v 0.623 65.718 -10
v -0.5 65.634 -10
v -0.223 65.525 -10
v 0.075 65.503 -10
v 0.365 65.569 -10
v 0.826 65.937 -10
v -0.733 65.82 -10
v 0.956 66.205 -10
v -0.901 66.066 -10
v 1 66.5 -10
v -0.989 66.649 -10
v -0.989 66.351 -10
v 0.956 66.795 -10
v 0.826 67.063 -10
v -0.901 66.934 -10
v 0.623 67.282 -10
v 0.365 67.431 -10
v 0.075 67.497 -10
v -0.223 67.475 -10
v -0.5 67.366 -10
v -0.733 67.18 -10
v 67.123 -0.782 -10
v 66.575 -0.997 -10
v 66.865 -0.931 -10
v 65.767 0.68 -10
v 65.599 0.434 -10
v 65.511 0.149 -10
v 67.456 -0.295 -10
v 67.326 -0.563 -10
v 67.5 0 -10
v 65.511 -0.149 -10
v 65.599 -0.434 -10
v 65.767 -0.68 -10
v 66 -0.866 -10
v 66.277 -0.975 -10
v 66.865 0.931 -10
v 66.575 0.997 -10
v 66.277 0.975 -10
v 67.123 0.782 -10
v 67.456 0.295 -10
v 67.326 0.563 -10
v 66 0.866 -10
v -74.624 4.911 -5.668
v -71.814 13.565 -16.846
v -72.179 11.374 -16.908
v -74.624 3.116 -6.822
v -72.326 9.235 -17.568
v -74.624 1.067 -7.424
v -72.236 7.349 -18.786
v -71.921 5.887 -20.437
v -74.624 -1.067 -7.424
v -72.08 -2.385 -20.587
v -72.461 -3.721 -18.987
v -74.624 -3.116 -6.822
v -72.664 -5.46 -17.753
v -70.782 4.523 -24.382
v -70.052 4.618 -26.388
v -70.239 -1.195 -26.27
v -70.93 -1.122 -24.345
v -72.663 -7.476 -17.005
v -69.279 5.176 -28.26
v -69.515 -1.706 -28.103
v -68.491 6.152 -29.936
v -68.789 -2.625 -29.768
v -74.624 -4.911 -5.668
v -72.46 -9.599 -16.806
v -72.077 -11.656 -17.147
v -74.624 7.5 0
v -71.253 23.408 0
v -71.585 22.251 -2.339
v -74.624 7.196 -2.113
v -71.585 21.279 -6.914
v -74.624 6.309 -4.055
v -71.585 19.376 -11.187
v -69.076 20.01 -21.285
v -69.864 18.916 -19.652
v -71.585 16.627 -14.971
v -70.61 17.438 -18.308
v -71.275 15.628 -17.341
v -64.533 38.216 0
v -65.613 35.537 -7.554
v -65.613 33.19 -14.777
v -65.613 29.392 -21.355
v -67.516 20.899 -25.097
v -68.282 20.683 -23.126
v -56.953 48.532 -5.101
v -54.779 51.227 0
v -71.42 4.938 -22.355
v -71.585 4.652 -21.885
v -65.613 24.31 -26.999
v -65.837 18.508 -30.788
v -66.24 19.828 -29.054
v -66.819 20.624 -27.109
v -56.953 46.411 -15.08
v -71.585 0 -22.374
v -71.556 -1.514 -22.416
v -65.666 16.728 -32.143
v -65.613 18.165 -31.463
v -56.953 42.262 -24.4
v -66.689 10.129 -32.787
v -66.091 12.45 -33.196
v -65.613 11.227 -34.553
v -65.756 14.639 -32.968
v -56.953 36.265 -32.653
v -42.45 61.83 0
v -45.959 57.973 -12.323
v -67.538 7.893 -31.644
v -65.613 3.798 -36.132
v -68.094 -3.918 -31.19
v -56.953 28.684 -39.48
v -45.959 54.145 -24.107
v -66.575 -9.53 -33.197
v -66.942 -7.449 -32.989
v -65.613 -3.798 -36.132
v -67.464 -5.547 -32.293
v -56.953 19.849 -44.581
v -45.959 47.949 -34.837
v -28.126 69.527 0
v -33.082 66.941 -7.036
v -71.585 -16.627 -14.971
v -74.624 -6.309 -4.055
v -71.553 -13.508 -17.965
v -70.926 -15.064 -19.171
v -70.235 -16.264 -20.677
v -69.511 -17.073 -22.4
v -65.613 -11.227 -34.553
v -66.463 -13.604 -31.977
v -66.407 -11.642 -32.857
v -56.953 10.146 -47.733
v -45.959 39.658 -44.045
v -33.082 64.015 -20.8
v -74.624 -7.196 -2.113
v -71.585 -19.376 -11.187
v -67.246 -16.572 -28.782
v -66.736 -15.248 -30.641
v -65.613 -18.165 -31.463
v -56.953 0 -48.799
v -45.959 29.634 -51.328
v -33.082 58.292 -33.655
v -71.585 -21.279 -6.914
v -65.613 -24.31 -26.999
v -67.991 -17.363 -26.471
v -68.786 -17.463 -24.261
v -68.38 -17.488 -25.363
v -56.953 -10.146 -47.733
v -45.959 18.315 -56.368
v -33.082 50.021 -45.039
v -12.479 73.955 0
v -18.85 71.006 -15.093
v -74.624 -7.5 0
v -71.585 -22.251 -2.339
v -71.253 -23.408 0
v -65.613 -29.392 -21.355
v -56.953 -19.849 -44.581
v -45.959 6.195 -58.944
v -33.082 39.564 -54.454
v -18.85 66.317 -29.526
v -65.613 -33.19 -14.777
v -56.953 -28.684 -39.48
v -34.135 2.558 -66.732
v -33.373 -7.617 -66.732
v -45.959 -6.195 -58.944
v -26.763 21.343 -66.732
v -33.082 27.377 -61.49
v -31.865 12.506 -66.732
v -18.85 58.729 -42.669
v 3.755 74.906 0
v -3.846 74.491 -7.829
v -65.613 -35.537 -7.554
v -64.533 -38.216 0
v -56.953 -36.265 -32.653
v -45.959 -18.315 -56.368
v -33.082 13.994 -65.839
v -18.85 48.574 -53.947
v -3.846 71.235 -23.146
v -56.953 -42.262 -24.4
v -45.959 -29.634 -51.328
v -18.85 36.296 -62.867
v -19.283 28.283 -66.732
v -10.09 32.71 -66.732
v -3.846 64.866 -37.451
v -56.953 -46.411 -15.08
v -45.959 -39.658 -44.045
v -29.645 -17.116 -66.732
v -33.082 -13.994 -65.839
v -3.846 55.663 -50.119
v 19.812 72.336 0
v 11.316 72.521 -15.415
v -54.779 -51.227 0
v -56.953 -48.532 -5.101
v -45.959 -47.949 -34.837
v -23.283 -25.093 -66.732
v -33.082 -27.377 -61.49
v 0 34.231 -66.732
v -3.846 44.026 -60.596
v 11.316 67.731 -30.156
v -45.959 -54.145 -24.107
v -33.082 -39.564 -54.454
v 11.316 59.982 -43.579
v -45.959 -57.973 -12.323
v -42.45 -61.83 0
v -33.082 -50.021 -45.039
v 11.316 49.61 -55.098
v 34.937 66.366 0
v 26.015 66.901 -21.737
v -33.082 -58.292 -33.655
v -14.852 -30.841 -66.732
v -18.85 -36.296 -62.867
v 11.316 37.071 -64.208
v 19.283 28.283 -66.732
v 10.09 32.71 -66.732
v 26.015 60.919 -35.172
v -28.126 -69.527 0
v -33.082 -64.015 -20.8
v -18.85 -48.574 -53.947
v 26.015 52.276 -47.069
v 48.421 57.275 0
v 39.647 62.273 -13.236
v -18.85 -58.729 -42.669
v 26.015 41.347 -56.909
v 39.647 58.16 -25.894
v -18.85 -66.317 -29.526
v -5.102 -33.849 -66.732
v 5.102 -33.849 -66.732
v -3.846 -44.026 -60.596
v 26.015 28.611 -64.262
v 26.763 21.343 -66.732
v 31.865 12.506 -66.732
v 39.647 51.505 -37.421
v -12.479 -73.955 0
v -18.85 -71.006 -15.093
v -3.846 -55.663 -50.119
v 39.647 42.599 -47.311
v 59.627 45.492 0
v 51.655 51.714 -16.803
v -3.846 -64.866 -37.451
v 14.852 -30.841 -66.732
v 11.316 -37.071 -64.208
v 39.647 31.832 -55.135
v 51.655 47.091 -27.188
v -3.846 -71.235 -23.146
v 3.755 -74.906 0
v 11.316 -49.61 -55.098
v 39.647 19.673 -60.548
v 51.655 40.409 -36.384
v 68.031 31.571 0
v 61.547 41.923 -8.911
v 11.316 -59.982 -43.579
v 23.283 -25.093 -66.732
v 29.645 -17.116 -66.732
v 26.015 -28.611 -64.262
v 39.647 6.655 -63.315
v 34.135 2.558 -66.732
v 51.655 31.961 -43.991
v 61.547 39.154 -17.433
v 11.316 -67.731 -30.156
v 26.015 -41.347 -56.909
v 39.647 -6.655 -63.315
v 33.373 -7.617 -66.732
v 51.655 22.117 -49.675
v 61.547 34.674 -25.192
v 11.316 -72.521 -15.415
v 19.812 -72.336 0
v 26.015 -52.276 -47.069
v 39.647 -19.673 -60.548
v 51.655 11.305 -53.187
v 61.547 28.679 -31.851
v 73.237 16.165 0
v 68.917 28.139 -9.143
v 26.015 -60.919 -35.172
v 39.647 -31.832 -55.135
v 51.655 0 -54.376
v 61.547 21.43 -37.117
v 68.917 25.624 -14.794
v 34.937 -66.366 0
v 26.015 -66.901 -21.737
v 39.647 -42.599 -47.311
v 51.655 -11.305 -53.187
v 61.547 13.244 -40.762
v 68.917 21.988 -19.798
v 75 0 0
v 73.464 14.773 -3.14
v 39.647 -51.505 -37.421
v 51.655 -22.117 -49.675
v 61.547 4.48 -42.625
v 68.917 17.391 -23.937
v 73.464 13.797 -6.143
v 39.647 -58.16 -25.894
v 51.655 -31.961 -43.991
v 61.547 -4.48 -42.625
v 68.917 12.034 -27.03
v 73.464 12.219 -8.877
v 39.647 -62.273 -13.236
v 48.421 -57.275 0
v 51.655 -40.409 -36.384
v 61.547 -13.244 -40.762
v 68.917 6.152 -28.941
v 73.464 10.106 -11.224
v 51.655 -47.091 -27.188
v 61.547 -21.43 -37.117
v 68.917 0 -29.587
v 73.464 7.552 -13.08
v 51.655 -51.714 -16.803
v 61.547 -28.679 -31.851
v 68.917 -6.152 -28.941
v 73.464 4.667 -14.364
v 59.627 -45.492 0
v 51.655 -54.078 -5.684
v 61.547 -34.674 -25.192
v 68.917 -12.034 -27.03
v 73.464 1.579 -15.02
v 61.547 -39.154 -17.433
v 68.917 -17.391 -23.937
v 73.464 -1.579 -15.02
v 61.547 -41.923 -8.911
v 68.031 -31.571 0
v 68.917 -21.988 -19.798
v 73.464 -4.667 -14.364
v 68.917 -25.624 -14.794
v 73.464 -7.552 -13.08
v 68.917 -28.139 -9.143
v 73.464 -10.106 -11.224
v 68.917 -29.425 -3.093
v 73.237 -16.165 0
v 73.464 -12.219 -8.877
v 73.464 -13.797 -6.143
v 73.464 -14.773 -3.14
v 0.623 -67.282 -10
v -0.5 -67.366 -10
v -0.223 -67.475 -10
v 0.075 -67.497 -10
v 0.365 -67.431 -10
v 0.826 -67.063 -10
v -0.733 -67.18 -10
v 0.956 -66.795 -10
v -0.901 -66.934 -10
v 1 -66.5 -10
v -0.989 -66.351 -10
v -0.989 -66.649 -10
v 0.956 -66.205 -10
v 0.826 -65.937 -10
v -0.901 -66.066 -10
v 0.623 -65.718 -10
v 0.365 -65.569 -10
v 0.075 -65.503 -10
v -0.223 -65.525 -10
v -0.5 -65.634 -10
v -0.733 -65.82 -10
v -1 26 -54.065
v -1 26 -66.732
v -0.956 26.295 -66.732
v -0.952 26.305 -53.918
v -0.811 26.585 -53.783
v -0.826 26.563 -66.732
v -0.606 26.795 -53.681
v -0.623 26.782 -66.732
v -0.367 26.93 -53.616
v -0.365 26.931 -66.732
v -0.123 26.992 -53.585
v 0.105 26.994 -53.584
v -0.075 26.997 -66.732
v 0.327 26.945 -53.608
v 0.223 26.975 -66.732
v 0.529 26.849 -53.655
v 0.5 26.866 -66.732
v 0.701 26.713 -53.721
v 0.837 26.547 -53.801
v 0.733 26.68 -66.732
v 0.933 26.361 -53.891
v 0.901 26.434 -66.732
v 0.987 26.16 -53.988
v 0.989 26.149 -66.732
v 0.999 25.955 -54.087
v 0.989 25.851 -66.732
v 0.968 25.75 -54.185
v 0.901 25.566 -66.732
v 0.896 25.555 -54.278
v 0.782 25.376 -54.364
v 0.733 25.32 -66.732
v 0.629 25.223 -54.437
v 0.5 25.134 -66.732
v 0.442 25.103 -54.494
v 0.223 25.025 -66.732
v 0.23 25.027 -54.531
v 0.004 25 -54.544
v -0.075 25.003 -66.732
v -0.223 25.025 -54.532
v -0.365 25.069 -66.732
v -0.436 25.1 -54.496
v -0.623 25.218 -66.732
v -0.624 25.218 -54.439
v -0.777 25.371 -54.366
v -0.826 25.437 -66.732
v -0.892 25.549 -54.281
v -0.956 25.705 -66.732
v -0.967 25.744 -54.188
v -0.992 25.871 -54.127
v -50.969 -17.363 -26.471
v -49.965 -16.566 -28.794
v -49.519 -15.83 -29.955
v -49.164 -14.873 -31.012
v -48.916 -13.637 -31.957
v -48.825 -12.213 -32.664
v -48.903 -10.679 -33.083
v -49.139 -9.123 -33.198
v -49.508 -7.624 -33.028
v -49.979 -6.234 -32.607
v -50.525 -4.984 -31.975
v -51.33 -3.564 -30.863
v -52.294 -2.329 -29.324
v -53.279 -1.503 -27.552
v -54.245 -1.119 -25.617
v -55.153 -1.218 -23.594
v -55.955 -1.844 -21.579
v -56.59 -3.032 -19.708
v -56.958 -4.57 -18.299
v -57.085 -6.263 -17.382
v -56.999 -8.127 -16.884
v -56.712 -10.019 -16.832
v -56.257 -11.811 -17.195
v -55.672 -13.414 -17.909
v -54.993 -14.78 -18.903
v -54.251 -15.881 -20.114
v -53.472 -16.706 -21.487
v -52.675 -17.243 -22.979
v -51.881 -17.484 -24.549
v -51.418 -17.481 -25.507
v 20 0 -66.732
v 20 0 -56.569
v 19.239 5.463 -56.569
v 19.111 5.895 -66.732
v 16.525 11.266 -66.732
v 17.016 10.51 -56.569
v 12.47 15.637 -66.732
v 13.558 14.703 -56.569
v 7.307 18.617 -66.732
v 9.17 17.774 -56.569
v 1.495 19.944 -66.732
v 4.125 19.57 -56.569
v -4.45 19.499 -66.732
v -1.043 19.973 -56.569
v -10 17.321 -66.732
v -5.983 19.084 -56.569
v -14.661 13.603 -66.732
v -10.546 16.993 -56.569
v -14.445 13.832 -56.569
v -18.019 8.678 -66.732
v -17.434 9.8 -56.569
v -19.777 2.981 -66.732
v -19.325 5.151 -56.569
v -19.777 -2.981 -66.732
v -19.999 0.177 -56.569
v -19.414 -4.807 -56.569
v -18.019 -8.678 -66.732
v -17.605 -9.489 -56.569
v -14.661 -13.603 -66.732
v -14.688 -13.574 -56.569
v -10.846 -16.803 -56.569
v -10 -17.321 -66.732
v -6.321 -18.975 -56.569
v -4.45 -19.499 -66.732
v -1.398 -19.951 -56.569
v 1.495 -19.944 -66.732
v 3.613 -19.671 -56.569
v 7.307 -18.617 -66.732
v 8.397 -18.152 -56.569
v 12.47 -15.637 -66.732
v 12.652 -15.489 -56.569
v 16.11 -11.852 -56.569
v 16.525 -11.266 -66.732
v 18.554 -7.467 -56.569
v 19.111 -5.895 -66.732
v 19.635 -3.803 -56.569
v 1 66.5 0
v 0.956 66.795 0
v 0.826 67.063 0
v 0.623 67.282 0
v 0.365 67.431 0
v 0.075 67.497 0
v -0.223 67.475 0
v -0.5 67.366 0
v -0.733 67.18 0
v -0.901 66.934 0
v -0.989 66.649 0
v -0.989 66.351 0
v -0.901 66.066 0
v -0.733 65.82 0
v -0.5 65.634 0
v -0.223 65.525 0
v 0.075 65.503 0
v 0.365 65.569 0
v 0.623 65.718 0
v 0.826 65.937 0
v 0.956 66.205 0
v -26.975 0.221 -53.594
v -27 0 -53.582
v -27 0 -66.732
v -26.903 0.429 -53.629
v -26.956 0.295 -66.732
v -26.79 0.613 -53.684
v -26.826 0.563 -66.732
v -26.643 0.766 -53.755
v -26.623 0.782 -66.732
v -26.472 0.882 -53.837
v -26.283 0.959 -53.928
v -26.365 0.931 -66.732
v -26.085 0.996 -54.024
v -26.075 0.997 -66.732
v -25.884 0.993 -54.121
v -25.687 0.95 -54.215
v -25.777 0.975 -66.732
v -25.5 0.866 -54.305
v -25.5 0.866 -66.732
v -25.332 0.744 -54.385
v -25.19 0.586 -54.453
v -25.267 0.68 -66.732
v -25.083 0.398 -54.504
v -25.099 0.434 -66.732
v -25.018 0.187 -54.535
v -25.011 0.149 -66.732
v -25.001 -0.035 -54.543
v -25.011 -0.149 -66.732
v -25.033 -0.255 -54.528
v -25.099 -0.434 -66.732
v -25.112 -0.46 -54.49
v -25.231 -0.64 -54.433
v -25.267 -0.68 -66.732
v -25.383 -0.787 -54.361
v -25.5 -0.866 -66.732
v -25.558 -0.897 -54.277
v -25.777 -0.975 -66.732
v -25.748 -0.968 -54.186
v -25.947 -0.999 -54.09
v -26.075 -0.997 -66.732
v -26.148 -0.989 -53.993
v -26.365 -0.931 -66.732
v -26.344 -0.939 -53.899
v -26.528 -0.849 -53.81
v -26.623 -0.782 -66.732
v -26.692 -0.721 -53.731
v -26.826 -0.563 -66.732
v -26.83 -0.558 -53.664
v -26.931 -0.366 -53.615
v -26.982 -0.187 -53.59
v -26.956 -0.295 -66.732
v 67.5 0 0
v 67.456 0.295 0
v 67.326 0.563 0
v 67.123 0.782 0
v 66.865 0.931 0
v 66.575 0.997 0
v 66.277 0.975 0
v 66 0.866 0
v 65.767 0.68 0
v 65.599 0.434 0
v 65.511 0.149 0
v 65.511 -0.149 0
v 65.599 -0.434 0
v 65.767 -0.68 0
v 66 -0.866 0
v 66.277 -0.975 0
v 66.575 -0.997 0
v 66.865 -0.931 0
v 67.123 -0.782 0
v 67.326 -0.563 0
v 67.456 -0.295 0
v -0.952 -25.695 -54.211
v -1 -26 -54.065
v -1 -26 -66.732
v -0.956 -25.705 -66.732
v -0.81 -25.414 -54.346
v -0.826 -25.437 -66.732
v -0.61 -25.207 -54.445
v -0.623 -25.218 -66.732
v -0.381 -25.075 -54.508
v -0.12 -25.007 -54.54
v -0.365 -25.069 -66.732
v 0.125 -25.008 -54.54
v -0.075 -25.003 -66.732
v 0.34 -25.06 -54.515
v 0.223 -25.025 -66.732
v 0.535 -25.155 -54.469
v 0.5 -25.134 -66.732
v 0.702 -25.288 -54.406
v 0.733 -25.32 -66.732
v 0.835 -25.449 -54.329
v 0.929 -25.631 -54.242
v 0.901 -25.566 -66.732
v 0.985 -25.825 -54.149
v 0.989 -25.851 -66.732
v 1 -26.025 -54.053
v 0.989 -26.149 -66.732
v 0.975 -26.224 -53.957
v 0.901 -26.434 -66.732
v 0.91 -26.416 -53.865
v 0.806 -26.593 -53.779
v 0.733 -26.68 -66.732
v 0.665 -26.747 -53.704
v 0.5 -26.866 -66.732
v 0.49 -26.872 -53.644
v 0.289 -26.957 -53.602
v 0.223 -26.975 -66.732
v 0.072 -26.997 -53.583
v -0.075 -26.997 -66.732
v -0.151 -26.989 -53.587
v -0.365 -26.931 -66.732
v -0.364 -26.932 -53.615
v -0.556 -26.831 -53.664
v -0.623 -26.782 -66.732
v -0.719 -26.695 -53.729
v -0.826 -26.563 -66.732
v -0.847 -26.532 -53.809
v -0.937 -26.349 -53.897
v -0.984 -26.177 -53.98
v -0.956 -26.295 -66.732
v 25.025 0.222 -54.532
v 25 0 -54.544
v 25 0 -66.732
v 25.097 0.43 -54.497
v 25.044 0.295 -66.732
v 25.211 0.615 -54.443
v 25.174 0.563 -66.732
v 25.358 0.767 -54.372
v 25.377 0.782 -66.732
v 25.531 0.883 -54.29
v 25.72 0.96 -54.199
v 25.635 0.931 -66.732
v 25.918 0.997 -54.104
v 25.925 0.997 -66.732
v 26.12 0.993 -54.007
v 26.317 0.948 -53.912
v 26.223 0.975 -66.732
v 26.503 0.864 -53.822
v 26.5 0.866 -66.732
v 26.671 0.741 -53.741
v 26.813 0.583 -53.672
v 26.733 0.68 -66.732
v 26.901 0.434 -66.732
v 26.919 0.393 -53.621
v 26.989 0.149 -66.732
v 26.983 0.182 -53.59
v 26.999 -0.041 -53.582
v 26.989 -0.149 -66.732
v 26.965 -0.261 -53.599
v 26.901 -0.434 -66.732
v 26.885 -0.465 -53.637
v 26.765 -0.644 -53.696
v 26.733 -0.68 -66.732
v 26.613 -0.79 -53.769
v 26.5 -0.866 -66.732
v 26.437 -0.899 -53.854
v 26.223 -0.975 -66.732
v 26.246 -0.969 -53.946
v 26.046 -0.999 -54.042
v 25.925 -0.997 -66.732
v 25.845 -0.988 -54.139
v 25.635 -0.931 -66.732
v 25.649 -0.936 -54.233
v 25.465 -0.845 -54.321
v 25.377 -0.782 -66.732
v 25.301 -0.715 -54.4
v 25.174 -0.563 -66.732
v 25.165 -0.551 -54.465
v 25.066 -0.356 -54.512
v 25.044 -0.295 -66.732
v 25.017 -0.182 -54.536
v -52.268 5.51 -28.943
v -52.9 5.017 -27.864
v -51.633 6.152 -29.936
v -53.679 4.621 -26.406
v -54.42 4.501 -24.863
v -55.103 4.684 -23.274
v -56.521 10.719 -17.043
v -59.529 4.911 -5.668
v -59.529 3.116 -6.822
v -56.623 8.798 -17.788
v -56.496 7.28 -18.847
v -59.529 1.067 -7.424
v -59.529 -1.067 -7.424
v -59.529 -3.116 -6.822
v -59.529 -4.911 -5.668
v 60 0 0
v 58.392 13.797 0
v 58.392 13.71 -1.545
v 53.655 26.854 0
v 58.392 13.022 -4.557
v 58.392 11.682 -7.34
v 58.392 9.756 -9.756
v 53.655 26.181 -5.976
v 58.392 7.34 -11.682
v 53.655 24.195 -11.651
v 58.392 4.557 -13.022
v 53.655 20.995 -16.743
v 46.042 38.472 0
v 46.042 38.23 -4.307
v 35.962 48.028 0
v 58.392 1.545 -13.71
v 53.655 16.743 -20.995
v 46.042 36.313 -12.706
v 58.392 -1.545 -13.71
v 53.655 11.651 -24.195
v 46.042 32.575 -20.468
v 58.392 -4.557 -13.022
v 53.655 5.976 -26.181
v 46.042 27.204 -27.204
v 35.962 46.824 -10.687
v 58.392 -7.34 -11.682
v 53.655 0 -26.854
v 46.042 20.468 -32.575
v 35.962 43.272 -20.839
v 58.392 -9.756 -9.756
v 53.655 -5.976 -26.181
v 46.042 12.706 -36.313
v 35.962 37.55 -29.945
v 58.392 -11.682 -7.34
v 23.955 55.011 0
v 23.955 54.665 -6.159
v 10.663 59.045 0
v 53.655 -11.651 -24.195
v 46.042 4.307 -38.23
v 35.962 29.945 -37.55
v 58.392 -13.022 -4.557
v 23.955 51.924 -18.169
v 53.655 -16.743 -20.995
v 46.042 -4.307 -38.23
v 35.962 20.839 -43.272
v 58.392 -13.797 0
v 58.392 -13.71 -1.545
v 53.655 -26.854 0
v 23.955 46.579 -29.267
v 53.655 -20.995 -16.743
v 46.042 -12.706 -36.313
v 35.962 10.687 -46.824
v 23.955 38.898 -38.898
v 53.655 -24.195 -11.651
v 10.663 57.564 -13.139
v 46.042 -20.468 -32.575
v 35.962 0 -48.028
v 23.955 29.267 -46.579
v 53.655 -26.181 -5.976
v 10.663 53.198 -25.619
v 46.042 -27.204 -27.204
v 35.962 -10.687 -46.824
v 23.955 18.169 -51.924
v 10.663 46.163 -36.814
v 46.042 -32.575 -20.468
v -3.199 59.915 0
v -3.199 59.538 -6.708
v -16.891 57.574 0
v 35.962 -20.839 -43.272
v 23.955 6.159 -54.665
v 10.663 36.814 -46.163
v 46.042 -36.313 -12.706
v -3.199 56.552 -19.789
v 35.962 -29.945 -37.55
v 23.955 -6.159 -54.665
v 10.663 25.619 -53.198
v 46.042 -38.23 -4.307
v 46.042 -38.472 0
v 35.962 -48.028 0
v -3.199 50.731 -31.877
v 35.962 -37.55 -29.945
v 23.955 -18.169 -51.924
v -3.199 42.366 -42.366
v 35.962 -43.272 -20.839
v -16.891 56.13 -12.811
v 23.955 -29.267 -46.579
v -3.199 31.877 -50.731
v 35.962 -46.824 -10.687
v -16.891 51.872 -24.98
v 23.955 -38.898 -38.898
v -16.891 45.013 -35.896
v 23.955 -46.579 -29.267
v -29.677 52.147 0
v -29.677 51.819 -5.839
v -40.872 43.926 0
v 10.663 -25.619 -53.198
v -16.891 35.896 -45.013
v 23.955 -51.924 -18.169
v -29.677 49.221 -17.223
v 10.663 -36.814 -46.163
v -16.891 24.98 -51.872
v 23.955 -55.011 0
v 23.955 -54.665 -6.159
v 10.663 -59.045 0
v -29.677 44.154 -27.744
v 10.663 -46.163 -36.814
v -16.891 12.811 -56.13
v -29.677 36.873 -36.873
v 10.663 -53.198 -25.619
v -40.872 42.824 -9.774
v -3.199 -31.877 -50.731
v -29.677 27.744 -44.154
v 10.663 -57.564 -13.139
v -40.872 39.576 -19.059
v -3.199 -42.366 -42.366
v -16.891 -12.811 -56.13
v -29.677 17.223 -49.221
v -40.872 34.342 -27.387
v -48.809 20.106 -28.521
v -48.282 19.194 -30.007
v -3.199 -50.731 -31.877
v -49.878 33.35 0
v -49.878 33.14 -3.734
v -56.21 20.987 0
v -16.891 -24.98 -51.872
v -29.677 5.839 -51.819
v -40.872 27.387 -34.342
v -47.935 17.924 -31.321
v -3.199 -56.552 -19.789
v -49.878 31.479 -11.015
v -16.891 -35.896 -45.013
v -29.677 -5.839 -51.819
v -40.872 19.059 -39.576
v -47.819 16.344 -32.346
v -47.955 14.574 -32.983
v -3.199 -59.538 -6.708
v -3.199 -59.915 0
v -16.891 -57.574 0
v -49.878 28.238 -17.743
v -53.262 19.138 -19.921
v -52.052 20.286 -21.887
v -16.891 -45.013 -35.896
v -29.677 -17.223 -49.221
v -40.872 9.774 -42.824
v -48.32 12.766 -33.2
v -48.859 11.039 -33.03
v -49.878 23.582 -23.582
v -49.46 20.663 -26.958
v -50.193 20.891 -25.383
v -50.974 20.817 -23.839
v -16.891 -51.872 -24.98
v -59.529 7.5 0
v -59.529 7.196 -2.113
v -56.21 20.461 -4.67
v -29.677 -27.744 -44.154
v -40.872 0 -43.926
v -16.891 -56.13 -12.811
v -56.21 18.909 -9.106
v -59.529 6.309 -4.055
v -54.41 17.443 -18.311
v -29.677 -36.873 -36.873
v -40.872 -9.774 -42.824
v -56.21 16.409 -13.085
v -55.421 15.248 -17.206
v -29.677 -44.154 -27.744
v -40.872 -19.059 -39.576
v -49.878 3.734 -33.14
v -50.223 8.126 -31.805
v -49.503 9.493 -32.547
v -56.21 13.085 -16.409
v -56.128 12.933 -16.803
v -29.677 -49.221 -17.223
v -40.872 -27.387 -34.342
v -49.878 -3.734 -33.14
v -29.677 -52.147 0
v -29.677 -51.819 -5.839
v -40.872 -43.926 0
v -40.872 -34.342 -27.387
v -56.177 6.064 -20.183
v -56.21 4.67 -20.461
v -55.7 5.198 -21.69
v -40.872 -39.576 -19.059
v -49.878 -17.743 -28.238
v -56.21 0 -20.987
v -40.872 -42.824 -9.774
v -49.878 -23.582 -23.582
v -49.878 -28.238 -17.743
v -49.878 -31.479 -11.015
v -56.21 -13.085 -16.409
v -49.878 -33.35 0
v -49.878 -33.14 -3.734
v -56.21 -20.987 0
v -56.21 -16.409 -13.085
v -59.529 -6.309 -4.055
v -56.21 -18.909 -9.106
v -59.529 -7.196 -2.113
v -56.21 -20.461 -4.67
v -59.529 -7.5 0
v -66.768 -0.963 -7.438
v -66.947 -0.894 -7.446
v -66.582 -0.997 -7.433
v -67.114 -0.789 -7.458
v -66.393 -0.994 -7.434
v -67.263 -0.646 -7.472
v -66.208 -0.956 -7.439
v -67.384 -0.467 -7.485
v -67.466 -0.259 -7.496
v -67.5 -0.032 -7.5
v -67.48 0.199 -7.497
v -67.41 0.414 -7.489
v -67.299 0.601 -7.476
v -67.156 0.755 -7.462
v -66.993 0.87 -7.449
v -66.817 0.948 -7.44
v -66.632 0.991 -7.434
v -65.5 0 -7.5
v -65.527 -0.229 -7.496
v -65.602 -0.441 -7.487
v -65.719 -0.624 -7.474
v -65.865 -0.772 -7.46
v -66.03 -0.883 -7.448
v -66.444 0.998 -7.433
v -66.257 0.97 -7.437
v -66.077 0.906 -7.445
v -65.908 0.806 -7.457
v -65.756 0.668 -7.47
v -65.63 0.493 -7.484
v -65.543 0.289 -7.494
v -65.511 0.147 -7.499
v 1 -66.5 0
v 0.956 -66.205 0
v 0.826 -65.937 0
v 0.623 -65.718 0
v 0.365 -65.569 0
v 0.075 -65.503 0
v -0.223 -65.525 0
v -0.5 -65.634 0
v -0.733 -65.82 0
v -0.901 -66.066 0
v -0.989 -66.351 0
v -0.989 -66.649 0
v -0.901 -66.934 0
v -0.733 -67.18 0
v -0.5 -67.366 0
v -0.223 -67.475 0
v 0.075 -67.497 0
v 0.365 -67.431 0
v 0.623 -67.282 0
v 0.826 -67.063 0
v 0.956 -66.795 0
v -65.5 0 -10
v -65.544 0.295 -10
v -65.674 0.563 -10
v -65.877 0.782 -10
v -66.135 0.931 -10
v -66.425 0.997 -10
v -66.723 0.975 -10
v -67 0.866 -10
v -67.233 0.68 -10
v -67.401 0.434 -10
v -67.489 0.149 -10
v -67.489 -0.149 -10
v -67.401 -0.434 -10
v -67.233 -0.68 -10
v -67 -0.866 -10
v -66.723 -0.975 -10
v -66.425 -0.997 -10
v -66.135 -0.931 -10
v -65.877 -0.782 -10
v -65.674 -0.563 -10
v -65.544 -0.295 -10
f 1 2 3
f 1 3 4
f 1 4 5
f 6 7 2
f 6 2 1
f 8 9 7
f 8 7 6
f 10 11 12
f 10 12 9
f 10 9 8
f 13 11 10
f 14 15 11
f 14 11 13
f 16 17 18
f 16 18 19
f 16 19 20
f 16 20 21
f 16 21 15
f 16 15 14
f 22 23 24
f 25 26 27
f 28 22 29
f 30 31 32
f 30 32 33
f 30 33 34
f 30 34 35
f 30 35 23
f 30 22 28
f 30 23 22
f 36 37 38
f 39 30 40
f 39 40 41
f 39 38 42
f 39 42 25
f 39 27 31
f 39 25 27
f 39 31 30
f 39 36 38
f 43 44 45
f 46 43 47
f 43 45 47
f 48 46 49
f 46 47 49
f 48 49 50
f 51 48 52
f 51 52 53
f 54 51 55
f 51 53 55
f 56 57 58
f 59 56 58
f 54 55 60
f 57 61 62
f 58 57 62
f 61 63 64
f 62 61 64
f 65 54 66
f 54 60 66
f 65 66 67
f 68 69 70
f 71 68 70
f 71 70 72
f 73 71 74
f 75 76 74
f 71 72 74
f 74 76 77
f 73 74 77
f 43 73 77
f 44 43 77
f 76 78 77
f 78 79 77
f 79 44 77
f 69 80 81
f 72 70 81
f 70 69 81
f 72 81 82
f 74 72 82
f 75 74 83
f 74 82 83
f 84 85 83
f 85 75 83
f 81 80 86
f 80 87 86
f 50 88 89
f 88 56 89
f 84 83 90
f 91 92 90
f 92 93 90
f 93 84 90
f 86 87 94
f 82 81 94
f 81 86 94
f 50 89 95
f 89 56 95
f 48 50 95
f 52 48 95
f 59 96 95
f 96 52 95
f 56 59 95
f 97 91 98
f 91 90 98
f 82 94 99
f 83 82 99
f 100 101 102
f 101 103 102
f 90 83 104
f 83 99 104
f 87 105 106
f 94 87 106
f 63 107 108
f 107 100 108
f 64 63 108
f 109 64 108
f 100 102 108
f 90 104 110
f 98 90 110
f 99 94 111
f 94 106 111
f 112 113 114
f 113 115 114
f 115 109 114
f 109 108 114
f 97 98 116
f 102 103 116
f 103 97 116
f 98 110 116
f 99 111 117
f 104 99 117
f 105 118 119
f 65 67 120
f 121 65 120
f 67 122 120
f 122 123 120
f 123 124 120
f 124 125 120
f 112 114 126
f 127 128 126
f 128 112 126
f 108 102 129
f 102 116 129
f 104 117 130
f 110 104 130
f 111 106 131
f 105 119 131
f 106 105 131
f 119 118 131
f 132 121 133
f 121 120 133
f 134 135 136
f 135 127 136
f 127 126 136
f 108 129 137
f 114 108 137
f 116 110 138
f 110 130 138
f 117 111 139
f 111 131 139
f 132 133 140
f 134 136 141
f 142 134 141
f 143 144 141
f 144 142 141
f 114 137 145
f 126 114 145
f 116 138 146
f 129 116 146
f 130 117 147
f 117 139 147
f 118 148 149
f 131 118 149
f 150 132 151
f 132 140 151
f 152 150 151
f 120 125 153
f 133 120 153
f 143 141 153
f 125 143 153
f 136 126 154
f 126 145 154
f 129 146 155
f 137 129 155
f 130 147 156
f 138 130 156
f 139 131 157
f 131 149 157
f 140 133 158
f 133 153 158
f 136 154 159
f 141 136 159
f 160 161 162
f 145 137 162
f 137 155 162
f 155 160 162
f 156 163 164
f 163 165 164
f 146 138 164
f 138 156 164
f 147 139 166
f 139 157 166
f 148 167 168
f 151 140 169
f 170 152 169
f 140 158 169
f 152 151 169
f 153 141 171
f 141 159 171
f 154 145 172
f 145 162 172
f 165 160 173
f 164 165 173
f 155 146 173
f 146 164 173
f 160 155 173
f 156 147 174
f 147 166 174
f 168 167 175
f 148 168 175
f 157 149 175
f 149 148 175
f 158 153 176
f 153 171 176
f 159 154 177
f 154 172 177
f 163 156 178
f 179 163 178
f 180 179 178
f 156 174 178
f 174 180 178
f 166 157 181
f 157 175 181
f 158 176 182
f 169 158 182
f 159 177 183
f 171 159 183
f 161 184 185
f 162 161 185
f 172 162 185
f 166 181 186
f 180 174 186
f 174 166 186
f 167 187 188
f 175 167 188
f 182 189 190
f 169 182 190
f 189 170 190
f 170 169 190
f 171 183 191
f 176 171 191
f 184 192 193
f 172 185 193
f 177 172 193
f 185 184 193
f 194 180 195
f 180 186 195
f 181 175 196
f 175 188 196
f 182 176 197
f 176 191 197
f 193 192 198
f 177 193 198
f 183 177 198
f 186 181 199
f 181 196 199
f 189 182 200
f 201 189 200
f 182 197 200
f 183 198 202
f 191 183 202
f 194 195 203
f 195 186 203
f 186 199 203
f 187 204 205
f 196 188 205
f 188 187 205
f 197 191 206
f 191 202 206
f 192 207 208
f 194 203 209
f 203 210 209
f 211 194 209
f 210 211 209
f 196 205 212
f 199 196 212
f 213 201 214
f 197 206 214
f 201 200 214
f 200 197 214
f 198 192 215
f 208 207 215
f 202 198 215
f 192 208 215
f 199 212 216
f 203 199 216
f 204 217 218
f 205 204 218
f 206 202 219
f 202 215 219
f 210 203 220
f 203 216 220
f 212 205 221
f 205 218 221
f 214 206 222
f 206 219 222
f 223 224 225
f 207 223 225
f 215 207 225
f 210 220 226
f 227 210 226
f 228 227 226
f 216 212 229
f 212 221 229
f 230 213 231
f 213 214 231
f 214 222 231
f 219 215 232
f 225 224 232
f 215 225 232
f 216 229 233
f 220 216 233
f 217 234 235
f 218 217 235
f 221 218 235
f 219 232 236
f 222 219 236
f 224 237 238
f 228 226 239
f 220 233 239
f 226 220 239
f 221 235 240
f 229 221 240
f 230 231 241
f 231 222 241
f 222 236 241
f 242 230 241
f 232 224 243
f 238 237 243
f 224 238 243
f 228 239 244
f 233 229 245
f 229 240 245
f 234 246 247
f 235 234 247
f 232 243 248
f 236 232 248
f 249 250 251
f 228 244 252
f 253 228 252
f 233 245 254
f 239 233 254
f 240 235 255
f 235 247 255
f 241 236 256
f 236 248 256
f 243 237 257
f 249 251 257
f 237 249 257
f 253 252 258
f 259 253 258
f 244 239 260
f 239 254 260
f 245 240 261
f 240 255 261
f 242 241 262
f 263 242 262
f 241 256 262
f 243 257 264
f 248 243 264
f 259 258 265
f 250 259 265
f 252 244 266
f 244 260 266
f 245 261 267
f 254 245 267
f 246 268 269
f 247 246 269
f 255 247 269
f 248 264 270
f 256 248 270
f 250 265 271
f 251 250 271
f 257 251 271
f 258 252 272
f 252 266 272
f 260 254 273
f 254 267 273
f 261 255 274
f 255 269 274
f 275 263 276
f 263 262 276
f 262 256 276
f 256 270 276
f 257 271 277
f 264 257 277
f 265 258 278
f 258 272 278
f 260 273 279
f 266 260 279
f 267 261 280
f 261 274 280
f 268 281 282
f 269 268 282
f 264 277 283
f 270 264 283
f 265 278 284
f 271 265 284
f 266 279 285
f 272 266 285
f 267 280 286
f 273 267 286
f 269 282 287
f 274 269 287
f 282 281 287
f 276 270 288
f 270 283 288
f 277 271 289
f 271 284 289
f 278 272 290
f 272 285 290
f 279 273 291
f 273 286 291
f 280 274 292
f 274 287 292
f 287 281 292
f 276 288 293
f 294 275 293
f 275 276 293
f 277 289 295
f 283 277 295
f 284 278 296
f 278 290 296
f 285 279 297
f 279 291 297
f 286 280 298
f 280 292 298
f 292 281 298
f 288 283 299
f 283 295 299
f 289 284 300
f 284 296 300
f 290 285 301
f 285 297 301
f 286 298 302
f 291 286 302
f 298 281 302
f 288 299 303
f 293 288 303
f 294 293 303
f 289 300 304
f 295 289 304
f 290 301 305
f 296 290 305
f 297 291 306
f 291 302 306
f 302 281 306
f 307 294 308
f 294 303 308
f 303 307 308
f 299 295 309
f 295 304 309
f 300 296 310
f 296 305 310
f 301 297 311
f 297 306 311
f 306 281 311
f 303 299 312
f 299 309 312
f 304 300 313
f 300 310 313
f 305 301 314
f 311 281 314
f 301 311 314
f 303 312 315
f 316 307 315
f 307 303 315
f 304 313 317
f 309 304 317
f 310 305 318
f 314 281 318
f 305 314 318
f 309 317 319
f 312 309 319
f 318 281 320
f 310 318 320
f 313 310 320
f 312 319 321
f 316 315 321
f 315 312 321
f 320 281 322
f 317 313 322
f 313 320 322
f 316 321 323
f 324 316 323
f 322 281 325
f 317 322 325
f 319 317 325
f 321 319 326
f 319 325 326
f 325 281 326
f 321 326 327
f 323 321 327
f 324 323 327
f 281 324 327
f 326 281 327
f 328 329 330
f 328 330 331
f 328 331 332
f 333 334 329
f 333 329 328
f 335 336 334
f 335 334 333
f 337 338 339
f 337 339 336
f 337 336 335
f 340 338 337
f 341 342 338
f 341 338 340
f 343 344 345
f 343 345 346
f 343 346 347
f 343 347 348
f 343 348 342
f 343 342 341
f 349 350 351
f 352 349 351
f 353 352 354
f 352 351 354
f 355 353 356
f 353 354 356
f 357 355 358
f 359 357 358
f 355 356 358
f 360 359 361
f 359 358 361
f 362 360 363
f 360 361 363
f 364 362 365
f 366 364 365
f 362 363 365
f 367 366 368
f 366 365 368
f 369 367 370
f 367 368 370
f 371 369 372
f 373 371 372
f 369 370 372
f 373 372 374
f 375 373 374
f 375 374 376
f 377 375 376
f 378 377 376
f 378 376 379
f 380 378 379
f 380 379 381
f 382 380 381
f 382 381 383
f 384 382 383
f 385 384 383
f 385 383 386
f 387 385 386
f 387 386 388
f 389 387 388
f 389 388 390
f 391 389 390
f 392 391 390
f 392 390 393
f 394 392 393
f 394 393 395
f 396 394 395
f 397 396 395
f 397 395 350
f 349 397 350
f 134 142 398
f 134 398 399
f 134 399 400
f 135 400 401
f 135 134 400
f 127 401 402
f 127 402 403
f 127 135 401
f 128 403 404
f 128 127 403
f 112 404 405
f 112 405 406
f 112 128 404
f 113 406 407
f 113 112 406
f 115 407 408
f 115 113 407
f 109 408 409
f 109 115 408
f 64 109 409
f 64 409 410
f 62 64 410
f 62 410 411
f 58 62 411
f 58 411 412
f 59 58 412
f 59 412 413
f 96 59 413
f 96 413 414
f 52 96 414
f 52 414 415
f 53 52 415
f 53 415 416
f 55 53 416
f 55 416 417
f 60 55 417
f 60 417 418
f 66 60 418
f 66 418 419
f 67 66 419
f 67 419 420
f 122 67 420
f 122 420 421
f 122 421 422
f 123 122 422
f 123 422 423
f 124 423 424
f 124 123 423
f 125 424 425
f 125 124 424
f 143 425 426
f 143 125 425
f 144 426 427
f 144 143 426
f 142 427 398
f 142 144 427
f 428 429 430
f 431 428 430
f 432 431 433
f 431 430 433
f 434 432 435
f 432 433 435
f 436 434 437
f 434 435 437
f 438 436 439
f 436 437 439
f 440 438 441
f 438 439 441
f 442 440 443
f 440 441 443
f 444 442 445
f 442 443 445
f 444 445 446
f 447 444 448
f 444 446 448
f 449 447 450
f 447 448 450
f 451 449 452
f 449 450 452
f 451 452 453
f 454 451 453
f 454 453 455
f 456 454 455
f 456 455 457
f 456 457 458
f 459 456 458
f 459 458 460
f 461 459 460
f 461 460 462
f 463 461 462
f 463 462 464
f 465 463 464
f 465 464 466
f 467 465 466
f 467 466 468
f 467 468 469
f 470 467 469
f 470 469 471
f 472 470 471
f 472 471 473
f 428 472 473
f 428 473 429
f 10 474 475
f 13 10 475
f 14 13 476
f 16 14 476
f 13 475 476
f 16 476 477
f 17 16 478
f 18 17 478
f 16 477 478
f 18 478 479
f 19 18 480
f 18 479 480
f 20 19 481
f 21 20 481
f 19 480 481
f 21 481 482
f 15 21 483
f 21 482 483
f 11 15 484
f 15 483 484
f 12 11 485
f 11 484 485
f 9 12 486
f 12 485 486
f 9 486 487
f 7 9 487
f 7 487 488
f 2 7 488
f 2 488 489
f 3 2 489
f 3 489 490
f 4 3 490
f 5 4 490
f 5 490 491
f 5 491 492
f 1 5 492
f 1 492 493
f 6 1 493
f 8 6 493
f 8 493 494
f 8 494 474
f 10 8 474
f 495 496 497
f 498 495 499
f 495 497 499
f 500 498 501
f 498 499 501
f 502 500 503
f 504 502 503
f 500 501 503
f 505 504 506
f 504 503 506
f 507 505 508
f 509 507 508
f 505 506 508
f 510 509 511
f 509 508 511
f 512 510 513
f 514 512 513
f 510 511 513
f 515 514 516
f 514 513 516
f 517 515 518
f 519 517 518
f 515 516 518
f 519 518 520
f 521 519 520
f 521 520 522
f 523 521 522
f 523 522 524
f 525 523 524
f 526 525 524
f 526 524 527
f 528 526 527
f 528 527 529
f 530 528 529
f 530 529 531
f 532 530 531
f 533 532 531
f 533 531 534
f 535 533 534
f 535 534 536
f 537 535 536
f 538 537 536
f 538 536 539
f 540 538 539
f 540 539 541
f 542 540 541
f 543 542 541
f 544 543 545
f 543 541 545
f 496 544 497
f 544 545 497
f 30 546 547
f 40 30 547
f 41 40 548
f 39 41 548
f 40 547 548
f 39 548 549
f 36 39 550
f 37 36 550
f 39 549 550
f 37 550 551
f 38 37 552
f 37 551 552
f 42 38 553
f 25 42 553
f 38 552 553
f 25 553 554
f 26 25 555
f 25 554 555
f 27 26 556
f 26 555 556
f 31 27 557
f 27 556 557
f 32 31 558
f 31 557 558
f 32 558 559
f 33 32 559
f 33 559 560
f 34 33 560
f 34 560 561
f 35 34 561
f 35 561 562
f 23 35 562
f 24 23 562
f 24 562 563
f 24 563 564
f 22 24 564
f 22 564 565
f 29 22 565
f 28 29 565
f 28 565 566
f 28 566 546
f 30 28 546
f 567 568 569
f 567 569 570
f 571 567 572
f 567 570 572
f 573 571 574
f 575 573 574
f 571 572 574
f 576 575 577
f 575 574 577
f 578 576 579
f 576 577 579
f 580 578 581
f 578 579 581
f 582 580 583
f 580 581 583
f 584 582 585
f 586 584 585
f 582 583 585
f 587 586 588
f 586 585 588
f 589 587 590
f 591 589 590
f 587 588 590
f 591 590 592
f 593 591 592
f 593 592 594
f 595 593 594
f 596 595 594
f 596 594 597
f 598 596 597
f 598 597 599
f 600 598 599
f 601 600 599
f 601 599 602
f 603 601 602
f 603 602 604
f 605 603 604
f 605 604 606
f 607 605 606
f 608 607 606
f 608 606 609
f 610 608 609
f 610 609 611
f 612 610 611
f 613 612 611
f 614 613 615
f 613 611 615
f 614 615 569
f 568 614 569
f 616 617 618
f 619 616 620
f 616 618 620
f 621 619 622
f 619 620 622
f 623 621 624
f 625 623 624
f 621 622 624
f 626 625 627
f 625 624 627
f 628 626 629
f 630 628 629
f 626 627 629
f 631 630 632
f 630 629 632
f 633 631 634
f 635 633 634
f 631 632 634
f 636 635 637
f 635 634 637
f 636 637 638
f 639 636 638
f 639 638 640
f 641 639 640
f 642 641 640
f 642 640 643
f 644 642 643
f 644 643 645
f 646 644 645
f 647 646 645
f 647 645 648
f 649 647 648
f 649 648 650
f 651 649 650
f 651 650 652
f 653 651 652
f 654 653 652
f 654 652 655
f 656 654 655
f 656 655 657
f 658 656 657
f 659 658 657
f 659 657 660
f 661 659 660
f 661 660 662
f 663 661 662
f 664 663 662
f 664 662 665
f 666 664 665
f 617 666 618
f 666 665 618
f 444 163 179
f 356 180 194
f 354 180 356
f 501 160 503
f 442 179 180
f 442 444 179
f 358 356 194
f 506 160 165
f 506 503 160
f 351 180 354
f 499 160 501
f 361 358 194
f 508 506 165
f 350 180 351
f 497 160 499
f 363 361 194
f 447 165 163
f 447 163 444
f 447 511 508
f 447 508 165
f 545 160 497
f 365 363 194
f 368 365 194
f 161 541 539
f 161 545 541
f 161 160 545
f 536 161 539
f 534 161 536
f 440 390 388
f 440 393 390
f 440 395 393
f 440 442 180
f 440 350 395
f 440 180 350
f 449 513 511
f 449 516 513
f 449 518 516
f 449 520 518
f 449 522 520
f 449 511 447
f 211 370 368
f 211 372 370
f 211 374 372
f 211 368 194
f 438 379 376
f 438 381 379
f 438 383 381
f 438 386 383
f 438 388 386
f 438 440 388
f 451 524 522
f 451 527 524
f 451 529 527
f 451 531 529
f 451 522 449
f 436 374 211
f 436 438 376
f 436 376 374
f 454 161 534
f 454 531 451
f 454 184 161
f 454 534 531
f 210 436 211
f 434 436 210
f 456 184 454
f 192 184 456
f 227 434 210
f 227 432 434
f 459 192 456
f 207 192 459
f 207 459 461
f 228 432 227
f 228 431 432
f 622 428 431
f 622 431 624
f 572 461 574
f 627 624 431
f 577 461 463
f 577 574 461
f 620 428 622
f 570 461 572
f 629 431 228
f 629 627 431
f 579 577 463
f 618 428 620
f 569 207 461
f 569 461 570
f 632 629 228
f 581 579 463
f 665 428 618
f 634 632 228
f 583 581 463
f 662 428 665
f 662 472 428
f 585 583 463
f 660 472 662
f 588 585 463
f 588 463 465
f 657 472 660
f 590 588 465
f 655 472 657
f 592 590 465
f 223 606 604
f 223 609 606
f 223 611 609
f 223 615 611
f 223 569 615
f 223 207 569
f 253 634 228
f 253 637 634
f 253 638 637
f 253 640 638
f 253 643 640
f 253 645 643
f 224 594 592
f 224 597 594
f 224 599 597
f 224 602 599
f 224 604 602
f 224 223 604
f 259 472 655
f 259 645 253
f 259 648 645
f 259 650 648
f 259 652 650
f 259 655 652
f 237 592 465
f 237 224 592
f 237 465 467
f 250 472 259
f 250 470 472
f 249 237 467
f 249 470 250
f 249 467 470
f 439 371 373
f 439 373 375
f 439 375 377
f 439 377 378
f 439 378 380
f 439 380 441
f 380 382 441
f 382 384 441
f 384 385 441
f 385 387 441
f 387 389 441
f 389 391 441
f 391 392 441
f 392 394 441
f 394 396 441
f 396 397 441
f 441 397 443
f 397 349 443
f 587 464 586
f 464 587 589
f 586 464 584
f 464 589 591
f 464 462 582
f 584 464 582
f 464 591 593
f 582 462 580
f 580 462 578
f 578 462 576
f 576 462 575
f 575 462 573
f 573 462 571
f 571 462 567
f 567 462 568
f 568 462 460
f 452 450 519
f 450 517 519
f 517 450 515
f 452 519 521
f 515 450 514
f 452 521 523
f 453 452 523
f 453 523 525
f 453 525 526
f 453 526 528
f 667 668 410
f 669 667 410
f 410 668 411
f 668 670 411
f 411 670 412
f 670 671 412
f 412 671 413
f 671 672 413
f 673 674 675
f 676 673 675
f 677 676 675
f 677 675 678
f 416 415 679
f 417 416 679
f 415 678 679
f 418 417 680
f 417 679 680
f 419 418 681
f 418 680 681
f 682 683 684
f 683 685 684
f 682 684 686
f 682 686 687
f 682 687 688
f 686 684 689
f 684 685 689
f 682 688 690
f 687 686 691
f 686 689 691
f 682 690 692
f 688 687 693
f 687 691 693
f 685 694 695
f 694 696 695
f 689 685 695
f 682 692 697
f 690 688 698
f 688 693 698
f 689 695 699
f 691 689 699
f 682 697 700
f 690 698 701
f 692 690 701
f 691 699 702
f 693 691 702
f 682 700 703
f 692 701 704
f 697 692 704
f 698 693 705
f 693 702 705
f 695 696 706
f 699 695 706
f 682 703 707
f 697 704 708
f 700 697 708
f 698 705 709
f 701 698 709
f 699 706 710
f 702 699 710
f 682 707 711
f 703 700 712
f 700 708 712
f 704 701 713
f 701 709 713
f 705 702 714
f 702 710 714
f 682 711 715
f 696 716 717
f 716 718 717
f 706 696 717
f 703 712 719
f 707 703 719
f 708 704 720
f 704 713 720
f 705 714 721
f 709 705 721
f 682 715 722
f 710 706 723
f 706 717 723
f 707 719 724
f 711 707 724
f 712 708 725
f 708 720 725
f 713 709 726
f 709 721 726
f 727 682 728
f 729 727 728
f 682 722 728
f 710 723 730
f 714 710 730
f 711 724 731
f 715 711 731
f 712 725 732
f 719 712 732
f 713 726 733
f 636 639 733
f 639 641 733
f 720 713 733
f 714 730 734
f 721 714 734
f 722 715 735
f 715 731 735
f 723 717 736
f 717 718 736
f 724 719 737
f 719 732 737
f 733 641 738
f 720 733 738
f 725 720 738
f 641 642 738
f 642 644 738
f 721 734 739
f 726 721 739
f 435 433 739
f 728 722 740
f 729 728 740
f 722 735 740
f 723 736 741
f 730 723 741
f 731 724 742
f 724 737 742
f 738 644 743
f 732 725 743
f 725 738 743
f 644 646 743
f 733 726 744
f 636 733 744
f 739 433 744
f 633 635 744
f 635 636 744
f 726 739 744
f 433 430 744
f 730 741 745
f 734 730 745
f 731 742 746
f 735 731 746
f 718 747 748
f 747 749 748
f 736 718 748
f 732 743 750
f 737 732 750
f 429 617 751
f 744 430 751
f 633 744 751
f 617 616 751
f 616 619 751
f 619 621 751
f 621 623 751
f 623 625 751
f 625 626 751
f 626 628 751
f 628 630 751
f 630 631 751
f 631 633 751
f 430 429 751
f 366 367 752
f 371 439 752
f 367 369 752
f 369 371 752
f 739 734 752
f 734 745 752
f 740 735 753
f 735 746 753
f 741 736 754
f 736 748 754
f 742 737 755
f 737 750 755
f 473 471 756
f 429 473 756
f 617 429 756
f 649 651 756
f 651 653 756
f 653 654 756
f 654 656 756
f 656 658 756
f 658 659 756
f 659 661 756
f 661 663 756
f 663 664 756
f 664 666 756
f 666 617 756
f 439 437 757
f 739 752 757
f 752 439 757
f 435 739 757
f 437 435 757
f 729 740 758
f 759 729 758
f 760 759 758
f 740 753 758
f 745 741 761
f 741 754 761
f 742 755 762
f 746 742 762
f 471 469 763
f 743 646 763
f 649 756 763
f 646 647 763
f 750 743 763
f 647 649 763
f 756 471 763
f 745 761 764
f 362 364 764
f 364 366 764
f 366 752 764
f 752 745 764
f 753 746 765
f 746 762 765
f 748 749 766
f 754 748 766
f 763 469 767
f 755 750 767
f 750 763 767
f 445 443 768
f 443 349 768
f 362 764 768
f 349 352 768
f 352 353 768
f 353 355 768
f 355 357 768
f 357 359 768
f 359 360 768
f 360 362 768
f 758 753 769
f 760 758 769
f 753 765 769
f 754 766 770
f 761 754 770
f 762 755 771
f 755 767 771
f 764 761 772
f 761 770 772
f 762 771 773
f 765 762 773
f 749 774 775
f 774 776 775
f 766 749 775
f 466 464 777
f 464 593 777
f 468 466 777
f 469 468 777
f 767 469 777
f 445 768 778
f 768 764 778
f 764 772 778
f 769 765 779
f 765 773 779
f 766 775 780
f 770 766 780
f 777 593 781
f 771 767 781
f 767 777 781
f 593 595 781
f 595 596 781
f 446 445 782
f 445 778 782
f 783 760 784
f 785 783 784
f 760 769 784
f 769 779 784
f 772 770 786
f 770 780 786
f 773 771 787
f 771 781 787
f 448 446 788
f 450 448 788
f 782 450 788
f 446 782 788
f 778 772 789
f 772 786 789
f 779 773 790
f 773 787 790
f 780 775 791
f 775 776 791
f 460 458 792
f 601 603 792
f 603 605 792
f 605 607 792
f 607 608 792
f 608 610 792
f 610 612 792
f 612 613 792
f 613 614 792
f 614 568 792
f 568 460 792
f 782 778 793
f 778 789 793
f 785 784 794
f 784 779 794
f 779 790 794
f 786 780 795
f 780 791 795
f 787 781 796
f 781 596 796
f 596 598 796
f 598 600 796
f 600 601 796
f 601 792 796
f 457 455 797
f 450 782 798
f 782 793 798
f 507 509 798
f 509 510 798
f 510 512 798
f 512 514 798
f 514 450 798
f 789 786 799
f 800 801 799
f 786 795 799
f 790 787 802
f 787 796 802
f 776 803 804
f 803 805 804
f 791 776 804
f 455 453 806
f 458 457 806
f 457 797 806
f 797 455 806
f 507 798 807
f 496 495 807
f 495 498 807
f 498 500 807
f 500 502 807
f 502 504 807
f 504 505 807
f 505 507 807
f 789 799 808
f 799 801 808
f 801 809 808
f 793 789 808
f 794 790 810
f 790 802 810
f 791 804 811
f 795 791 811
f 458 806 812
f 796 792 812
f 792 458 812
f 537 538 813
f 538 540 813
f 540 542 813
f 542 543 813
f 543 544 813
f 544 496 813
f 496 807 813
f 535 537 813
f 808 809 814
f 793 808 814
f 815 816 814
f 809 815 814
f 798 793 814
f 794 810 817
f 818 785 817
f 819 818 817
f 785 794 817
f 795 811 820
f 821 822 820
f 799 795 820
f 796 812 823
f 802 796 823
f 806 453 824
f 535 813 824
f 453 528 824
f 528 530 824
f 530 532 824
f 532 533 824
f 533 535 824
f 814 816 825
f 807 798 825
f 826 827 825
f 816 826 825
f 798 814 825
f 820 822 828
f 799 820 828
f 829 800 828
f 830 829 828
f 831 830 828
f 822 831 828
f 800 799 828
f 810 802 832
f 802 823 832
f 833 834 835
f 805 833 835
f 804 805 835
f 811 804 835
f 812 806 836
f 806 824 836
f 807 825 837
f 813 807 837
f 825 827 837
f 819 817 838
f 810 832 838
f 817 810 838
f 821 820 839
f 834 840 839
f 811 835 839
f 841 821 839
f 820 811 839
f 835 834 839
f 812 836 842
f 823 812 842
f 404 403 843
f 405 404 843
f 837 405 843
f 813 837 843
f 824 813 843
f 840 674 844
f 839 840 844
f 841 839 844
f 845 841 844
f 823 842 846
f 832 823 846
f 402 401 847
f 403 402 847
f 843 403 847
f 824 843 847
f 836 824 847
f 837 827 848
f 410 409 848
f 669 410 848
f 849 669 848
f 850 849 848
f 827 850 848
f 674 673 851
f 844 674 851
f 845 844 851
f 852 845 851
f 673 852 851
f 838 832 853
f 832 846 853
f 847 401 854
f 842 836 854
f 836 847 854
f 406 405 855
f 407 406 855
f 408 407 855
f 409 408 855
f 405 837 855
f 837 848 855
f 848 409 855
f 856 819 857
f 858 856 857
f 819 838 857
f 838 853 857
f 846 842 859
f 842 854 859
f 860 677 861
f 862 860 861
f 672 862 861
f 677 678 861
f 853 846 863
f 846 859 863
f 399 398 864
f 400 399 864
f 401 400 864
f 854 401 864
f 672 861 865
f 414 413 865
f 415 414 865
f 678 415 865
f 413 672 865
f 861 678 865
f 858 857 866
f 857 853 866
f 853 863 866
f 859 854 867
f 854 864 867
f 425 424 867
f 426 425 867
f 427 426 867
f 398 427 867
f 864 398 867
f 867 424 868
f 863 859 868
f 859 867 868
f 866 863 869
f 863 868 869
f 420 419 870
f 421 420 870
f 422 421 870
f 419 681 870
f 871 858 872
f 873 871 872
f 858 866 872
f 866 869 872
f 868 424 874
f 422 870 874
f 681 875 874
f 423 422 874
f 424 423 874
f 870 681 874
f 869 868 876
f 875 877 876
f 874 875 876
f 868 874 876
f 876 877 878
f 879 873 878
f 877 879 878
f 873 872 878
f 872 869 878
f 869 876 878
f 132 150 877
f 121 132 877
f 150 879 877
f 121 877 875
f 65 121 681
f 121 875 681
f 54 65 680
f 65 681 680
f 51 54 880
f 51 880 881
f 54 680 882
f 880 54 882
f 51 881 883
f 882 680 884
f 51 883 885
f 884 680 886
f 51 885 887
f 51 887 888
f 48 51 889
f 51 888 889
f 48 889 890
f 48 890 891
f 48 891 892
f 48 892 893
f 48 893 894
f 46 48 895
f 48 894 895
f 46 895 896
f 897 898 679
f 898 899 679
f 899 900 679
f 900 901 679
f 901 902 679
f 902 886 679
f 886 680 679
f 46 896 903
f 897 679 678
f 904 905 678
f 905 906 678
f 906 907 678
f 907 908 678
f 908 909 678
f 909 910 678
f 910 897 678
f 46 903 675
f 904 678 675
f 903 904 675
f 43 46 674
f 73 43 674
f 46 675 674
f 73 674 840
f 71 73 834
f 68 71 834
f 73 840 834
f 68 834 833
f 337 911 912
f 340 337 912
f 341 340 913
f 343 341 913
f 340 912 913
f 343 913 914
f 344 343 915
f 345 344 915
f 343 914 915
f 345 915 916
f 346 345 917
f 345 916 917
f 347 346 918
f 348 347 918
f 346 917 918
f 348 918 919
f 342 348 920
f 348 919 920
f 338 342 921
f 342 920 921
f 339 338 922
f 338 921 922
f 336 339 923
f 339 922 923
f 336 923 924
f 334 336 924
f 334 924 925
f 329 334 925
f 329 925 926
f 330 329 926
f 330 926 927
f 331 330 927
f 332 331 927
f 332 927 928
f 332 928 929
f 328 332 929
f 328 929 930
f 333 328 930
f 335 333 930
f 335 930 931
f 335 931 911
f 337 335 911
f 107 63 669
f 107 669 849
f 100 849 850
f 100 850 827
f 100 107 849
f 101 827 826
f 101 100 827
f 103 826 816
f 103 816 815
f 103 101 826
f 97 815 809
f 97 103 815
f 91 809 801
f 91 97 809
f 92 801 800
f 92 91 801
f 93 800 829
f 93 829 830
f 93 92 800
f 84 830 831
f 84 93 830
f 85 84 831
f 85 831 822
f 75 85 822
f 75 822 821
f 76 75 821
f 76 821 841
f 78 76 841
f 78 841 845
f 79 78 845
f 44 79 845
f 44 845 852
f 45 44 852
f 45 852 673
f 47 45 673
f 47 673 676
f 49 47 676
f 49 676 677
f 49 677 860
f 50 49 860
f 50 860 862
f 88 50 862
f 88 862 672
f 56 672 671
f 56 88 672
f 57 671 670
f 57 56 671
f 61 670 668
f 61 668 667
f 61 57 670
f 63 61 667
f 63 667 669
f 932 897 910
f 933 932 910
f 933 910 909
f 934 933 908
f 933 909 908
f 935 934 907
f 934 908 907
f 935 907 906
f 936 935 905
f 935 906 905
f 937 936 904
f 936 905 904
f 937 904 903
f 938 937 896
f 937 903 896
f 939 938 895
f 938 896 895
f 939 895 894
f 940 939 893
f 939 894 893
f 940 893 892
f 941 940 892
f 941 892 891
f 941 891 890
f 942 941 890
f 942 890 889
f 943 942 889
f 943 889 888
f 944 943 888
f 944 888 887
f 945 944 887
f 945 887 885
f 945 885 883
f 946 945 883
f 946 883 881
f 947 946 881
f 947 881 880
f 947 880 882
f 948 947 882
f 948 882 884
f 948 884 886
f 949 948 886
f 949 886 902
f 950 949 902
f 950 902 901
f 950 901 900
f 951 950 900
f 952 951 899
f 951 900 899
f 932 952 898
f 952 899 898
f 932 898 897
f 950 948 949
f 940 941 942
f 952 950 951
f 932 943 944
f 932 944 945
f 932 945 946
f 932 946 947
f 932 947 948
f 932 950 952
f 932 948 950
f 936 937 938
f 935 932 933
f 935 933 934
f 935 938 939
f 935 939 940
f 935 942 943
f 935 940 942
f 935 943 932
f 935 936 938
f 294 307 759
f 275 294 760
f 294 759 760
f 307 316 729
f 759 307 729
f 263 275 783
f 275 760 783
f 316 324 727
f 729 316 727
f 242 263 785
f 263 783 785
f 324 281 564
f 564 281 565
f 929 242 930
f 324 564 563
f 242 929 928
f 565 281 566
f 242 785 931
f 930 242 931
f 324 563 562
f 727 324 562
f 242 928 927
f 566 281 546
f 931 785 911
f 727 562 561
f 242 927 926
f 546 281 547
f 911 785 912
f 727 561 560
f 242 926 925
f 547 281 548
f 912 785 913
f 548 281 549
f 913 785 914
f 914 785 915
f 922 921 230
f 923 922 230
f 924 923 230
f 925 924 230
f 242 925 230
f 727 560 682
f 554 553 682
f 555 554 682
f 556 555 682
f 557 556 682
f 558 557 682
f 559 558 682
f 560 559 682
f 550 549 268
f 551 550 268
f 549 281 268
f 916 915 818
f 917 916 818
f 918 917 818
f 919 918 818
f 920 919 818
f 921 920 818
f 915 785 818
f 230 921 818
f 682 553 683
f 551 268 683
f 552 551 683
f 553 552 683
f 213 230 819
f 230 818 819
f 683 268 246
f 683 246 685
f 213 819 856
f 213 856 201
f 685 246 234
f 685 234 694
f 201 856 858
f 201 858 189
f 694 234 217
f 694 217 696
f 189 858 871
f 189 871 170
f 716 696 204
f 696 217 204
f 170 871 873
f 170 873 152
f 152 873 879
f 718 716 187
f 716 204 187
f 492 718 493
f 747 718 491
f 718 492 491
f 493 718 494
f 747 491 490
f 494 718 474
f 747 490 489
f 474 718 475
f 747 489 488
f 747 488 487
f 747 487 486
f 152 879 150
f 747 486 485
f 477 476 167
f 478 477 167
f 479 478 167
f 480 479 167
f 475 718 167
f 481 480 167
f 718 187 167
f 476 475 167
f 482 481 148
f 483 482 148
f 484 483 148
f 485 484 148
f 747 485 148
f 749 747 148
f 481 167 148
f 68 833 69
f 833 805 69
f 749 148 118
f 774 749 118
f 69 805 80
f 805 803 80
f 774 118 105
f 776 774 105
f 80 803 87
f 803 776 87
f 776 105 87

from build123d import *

# Parameters (mm, degrees)
REVOLU_O1_ANGLE            = 180
ESBO_O6_R                  = 20
CORTE_EXTRUS_O3_DEPTH      = 130.903810568
ESBO_O7_R                  = 7.5
CORTE_EXTRUS_O4_DEPTH      = 129.354976586
CORTE_EXTRUS_O5_DEPTH      = 50
CORTE_EXTRUS_O5_DEPTH_BACK = 44
ESBO_O8_W                  = 70
ESBO_O8_H                  = 12.551087697
ESBO_O9_R                  = 1
CORTE_EXTRUS_O6_DEPTH      = 126.312510747
SKETCH2_R                  = 8.2
CUT_EXTRUDE3_DEPTH         = 30
SKETCH4_R                  = 1
CUT_EXTRUDE4_DEPTH         = 20


with BuildPart() as part:
    # Esboço1 → Revolução1 (revolve)
    with BuildSketch(Plane.XY):
        with BuildLine():
            Line((-60, 0), (-75, 0))
            ThreePointArc((-75, 0), (0, 75), (75, 0))
            Line((75, 0), (60, 0))
            ThreePointArc((60, 0), (0, 60), (-60, 0))
        make_face()
    revolve(axis=Axis((-60, 0, 0), (-1, 0, 0)), revolution_arc=REVOLU_O1_ANGLE)

    # Esboço6 → Corte-extrusão3 (cut, through all)
    with BuildSketch(Plane.XY):
        Circle(ESBO_O6_R)
    extrude(amount=-CORTE_EXTRUS_O3_DEPTH, mode=Mode.SUBTRACT)

    # Esboço7 → Corte-extrusão4 (cut, through all)
    with BuildSketch(Plane(origin=(0, 0, 0), x_dir=(0, 0, -1), z_dir=(1, 0, 0))):
        Circle(ESBO_O7_R)
    extrude(amount=-CORTE_EXTRUS_O4_DEPTH, mode=Mode.SUBTRACT)

    # Esboço8 → Corte-extrusão5 (cut, two sides: drawn at the far end of the back side and taken through both)
    with BuildSketch(Plane(origin=(0, 0, 0), x_dir=(1, 0, 0), z_dir=(0, 1, 0)).offset(-CORTE_EXTRUS_O5_DEPTH_BACK)):
        with Locations((0, 73.008034748)):
            Rectangle(ESBO_O8_W, ESBO_O8_H)
    extrude(amount=CORTE_EXTRUS_O5_DEPTH + CORTE_EXTRUS_O5_DEPTH_BACK, mode=Mode.SUBTRACT)

    # Esboço9 → Corte-extrusão6 (cut, through all)
    with BuildSketch(Plane(origin=(0, 0, -66.7324909), x_dir=(-1, 0, 0), z_dir=(0, 0, -1))):
        with Locations((-26, 0)):
            Circle(ESBO_O9_R)
        with Locations((0, 26)):
            Circle(ESBO_O9_R)
        with Locations((26, 0)):
            Circle(ESBO_O9_R)
        with Locations((0, -26)):
            Circle(ESBO_O9_R)
    extrude(amount=-CORTE_EXTRUS_O6_DEPTH, mode=Mode.SUBTRACT)

    # Sketch2 → Cut-Extrude3 (cut)
    with BuildSketch(Plane(origin=(-74.624057783, 0, 0), x_dir=(0, 0, -1), z_dir=(1, 0, 0))):
        with Locations((25, -9.296175558)):
            Circle(SKETCH2_R)
        with Locations((25, 12.7)):
            Circle(SKETCH2_R)
    extrude(amount=CUT_EXTRUDE3_DEPTH, mode=Mode.SUBTRACT)

    # Sketch4 → Cut-Extrude4 (cut)
    with BuildSketch(Plane.XY.offset(10)):
        with Locations((66.5, 0)):
            Circle(SKETCH4_R)
        with Locations((0, -66.5)):
            Circle(SKETCH4_R)
        with Locations((-66.5, 0)):
            Circle(SKETCH4_R)
        with Locations((0, 66.5)):
            Circle(SKETCH4_R)
    extrude(amount=-CUT_EXTRUDE4_DEPTH, mode=Mode.SUBTRACT)


solid = part.part
